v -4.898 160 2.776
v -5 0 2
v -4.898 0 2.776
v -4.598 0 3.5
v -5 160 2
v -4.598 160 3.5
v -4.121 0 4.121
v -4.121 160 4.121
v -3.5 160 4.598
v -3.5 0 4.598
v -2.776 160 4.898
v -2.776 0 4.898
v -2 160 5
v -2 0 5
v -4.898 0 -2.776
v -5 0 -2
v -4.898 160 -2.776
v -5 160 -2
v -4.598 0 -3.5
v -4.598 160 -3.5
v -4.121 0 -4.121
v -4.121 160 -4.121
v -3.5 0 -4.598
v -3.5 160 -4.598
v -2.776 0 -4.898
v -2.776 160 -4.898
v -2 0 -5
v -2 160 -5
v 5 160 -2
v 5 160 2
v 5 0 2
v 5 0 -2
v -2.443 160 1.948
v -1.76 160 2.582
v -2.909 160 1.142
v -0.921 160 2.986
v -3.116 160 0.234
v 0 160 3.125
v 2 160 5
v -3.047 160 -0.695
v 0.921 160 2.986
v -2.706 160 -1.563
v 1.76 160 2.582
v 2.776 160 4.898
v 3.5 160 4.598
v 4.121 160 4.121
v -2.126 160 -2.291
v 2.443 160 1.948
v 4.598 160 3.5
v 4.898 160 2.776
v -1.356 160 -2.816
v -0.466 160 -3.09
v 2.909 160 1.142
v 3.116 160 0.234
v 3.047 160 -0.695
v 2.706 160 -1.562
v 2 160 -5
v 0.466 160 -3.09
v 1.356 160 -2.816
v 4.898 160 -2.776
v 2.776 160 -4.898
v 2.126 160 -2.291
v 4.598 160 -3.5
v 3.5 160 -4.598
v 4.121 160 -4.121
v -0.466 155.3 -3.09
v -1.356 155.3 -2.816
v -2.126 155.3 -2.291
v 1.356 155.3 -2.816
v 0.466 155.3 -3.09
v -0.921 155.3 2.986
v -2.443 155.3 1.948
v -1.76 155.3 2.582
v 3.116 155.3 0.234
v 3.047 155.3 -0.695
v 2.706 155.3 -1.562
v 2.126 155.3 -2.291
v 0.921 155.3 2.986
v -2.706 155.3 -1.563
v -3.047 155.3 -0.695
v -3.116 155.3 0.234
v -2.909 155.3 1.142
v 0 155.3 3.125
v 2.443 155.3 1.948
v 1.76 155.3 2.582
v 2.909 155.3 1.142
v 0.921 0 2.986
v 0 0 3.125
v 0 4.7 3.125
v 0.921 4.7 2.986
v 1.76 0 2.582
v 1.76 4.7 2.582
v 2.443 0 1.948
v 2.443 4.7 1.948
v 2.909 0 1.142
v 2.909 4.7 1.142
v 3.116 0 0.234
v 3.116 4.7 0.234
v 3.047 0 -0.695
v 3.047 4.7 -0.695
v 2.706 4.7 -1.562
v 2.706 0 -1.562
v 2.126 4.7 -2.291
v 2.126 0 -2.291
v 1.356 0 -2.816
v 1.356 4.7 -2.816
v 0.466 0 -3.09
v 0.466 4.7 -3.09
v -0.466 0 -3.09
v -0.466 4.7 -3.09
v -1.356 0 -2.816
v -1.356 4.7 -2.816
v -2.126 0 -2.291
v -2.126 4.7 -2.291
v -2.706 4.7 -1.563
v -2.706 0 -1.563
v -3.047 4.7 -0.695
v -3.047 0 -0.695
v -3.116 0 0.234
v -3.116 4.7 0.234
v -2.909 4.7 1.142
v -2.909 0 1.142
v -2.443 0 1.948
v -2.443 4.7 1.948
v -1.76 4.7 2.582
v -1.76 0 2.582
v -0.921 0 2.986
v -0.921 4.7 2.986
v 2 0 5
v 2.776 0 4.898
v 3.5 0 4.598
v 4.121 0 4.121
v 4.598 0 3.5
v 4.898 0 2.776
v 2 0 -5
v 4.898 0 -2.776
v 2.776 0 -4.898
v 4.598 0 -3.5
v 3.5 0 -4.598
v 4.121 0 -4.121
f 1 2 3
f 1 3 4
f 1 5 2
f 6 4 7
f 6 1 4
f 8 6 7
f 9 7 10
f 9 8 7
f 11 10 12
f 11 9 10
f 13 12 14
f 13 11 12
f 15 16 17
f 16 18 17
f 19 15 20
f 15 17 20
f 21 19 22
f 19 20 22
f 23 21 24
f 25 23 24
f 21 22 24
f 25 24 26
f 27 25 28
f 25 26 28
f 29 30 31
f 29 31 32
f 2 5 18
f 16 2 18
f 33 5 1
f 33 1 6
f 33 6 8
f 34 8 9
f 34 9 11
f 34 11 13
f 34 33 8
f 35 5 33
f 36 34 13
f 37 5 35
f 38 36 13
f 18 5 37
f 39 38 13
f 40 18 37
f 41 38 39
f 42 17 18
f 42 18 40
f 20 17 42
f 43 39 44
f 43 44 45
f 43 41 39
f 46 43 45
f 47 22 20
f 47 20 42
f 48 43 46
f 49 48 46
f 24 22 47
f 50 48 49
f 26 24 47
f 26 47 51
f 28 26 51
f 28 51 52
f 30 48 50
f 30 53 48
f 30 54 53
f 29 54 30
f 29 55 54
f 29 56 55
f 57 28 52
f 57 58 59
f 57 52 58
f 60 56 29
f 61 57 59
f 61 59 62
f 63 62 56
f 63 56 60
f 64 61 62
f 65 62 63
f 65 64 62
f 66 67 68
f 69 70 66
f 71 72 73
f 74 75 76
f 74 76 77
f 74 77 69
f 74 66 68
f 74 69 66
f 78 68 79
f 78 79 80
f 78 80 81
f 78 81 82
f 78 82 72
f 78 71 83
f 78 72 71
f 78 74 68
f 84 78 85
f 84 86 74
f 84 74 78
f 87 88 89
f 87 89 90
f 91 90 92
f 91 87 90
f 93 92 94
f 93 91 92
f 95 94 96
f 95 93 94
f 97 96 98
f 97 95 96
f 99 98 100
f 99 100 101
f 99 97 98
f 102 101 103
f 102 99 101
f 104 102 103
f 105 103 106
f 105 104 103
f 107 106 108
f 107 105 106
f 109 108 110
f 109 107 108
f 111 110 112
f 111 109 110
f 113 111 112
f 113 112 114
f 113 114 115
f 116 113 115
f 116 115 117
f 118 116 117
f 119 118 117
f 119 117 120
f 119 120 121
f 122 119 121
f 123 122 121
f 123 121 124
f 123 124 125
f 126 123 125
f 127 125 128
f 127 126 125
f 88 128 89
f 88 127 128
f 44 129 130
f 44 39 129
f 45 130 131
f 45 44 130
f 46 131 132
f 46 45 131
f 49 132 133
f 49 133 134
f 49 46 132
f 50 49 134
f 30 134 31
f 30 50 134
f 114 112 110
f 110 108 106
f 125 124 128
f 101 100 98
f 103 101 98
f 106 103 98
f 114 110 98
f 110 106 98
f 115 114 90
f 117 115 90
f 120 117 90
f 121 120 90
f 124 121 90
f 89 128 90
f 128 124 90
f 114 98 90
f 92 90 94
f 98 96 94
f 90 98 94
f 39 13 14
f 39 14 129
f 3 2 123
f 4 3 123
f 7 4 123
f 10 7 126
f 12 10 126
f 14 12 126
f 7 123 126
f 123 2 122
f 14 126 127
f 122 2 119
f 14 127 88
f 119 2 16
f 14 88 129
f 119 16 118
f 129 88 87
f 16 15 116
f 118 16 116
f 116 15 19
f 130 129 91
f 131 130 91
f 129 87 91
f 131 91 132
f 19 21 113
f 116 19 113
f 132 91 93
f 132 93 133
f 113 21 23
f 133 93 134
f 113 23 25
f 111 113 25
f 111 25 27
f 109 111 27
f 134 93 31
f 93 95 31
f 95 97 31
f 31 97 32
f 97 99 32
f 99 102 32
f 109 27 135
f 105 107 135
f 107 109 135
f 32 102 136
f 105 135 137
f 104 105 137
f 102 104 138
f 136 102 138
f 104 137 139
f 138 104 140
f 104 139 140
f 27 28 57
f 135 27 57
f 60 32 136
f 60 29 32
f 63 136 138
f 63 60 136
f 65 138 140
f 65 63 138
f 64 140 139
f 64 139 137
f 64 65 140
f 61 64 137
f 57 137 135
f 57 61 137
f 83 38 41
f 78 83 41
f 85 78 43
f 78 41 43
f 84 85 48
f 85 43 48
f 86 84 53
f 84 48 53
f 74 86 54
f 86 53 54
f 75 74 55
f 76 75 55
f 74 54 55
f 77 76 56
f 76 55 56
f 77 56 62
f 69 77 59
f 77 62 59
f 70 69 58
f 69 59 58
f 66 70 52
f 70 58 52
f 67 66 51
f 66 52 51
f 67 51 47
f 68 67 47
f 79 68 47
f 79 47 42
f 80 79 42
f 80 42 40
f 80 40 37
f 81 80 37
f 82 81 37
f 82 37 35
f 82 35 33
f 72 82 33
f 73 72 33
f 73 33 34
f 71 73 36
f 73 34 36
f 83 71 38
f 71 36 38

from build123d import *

# Parameters (mm, degrees)
SKETCH1_W           = 10
SKETCH1_H           = 10
BOSS_EXTRUDE1_DEPTH = 160
FILLET1_R           = 3
SKETCH2_R           = 3.125
CUT_EXTRUDE1_DEPTH  = 4.7
CUT_EXTRUDE2_START  = -160
SKETCH2_2_R         = 3.125
CUT_EXTRUDE2_DEPTH  = 4.7


with BuildPart() as part:
    # Sketch1 → Boss-Extrude1 (new body)
    with BuildSketch(Plane(origin=(0, 0, 0), x_dir=(1, 0, 0), z_dir=(0, 1, 0))):
        Rectangle(SKETCH1_W, SKETCH1_H)
    extrude(amount=BOSS_EXTRUDE1_DEPTH)

    # Fillet1
    fillet1_edges = [part.edges().sort_by_distance(p)[0] for p in [
        (-5, 80, -5),
        (5, 80, -5),
        (5, 80, 5),
        (-5, 80, 5),
    ]]
    fillet(fillet1_edges, radius=FILLET1_R)

    # Sketch2 → Cut-Extrude1 (cut)
    with BuildSketch(Plane(origin=(0, 160, 0), x_dir=(1, 0, 0), z_dir=(0, 1, 0))):
        with Locations(Location((0, 0, 0), (0, 0, 270))):
            Circle(SKETCH2_R)
    extrude(amount=-CUT_EXTRUDE1_DEPTH, mode=Mode.SUBTRACT)

    # Sketch2<2> → Cut-Extrude2 (cut)
    with BuildSketch(Plane(origin=(0, 160, 0), x_dir=(1, 0, 0), z_dir=(0, 1, 0)).offset(CUT_EXTRUDE2_START)):
        with Locations(Location((0, 0, 0), (0, 0, 270))):
            Circle(SKETCH2_2_R)
    extrude(amount=CUT_EXTRUDE2_DEPTH, mode=Mode.SUBTRACT)


solid = part.part
